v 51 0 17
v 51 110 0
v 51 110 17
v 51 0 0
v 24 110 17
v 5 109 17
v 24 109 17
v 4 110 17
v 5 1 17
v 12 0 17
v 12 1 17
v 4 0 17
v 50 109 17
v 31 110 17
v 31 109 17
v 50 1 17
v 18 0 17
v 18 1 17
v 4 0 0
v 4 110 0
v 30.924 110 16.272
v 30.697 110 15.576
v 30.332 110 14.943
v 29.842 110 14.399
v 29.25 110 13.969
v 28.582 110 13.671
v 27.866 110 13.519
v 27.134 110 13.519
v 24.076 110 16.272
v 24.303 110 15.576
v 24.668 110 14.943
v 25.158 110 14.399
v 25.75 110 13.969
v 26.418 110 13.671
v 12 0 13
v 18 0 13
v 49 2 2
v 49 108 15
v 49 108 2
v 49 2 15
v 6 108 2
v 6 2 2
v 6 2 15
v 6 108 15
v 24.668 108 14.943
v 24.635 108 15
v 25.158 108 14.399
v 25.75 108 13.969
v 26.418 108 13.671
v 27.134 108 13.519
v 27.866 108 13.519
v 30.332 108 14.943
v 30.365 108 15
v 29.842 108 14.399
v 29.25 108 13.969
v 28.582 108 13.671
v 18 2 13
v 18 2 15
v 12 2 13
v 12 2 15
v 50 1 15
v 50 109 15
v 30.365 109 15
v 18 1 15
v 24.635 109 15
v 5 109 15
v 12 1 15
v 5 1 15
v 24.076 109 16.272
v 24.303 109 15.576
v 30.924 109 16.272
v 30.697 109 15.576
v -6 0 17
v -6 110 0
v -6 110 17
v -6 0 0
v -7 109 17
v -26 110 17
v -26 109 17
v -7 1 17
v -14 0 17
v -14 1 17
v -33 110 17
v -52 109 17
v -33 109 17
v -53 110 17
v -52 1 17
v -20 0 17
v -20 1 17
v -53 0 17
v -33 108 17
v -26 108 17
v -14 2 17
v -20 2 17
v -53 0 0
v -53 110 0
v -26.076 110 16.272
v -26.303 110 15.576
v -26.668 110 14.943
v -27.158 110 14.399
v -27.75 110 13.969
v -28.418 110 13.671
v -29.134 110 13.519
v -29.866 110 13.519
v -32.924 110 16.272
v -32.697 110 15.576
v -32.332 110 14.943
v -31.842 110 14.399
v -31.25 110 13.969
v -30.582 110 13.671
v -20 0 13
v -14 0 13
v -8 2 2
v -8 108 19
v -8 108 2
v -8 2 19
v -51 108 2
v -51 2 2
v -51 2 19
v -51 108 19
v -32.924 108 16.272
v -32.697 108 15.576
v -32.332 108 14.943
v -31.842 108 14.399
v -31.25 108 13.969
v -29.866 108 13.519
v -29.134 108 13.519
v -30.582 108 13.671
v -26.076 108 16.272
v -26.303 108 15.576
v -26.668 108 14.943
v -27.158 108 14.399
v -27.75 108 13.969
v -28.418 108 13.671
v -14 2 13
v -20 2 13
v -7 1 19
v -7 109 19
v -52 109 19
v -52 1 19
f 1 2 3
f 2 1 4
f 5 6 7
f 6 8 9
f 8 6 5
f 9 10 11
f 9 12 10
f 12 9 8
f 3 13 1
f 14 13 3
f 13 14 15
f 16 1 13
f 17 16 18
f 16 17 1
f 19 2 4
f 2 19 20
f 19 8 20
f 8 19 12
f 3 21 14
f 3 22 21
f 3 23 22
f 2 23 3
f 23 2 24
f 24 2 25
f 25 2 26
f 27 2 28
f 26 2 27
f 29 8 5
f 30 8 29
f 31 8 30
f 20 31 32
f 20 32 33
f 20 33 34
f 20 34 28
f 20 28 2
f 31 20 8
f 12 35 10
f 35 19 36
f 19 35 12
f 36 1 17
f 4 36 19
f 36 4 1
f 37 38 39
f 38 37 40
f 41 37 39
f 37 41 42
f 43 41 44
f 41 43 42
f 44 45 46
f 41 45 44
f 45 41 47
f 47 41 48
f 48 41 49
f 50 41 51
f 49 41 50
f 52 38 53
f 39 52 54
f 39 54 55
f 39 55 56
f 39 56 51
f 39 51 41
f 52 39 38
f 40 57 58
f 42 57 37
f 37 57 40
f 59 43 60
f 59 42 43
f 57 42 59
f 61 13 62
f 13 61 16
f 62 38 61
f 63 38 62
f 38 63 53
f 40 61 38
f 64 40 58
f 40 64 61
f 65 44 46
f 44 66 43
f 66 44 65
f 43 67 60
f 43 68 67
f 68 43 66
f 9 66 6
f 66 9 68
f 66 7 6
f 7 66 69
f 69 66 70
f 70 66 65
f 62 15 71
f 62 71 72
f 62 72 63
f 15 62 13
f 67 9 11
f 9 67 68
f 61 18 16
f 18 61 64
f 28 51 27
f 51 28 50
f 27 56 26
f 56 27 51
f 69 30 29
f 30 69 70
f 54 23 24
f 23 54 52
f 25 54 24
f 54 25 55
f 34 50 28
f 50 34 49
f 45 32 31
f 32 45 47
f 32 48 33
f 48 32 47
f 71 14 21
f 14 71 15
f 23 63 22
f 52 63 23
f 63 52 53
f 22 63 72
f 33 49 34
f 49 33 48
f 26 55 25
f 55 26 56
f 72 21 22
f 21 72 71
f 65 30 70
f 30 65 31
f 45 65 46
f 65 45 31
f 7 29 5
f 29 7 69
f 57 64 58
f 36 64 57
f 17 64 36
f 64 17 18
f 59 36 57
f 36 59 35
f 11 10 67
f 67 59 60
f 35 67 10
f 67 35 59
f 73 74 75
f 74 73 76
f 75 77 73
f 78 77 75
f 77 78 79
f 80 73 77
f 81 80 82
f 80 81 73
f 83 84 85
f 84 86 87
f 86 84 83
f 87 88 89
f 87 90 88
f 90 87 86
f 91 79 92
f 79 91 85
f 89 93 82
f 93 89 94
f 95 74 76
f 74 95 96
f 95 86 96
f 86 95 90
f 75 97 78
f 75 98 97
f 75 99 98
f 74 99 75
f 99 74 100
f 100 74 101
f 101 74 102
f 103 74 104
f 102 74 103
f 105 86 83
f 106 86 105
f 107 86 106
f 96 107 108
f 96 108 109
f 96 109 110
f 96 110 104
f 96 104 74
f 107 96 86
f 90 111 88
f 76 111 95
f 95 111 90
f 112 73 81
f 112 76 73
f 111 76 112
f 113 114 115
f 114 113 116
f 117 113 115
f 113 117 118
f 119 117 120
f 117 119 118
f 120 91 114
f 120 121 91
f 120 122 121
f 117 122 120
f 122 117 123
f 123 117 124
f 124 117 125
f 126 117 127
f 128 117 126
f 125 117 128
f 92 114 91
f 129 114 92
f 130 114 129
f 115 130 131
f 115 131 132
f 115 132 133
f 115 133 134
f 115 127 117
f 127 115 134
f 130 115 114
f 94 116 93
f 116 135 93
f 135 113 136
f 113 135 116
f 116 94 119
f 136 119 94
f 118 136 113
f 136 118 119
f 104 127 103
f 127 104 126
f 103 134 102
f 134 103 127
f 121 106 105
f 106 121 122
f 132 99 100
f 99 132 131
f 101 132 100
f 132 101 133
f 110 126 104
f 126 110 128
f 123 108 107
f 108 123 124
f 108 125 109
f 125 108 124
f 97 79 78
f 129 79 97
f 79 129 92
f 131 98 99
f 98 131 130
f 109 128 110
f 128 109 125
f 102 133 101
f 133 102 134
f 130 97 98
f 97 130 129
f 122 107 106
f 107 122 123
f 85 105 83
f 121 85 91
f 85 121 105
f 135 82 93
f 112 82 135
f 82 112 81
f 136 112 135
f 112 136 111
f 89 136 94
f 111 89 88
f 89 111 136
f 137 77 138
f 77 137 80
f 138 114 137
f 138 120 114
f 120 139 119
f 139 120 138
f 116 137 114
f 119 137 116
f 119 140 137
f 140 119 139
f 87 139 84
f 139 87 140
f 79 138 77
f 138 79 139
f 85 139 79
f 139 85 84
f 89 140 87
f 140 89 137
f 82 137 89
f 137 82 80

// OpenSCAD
$fn = 30;

outerSize = [47, 110, 17];
innerSize = [43, 106, 17];

// Top
translate([4, 0, 0]){
    difference(){
        cube(outerSize);
        translate([2, 2, 2]){
            cube(innerSize);
        }
        translate([1,1,15]){
                cube([45, 108, 2]);
        }
        translate([23.5, 110, 17]){
            rotate([90, 0, 0]){
                cylinder(d=7, h=2);
            }
        }
        translate([8, 0, 13]){
            cube([6, 2,4]);
        }
    }
}

// Bottom
translate([-53, 0, 0]){
    union(){
        difference(){
            cube(outerSize);
            translate([2, 2, 2]){
                cube(innerSize);
            }
            translate([23.5, 110, 17]){
                rotate([90, 0, 0]){
                    cylinder(d=7, h=2);
                }
            }
            translate([33, 0, 13]){
                cube([6, 2,8]);
            }
        }
        difference(){
            translate([1,1,17]){
                cube([45, 108, 2]);
            }
            translate([2,2,17]){
                cube([43, 106, 2]);
            }
        }
    }
}
/*
        translate([1,1,15]){
                cube([45, 108, 2]);
        }
*/
